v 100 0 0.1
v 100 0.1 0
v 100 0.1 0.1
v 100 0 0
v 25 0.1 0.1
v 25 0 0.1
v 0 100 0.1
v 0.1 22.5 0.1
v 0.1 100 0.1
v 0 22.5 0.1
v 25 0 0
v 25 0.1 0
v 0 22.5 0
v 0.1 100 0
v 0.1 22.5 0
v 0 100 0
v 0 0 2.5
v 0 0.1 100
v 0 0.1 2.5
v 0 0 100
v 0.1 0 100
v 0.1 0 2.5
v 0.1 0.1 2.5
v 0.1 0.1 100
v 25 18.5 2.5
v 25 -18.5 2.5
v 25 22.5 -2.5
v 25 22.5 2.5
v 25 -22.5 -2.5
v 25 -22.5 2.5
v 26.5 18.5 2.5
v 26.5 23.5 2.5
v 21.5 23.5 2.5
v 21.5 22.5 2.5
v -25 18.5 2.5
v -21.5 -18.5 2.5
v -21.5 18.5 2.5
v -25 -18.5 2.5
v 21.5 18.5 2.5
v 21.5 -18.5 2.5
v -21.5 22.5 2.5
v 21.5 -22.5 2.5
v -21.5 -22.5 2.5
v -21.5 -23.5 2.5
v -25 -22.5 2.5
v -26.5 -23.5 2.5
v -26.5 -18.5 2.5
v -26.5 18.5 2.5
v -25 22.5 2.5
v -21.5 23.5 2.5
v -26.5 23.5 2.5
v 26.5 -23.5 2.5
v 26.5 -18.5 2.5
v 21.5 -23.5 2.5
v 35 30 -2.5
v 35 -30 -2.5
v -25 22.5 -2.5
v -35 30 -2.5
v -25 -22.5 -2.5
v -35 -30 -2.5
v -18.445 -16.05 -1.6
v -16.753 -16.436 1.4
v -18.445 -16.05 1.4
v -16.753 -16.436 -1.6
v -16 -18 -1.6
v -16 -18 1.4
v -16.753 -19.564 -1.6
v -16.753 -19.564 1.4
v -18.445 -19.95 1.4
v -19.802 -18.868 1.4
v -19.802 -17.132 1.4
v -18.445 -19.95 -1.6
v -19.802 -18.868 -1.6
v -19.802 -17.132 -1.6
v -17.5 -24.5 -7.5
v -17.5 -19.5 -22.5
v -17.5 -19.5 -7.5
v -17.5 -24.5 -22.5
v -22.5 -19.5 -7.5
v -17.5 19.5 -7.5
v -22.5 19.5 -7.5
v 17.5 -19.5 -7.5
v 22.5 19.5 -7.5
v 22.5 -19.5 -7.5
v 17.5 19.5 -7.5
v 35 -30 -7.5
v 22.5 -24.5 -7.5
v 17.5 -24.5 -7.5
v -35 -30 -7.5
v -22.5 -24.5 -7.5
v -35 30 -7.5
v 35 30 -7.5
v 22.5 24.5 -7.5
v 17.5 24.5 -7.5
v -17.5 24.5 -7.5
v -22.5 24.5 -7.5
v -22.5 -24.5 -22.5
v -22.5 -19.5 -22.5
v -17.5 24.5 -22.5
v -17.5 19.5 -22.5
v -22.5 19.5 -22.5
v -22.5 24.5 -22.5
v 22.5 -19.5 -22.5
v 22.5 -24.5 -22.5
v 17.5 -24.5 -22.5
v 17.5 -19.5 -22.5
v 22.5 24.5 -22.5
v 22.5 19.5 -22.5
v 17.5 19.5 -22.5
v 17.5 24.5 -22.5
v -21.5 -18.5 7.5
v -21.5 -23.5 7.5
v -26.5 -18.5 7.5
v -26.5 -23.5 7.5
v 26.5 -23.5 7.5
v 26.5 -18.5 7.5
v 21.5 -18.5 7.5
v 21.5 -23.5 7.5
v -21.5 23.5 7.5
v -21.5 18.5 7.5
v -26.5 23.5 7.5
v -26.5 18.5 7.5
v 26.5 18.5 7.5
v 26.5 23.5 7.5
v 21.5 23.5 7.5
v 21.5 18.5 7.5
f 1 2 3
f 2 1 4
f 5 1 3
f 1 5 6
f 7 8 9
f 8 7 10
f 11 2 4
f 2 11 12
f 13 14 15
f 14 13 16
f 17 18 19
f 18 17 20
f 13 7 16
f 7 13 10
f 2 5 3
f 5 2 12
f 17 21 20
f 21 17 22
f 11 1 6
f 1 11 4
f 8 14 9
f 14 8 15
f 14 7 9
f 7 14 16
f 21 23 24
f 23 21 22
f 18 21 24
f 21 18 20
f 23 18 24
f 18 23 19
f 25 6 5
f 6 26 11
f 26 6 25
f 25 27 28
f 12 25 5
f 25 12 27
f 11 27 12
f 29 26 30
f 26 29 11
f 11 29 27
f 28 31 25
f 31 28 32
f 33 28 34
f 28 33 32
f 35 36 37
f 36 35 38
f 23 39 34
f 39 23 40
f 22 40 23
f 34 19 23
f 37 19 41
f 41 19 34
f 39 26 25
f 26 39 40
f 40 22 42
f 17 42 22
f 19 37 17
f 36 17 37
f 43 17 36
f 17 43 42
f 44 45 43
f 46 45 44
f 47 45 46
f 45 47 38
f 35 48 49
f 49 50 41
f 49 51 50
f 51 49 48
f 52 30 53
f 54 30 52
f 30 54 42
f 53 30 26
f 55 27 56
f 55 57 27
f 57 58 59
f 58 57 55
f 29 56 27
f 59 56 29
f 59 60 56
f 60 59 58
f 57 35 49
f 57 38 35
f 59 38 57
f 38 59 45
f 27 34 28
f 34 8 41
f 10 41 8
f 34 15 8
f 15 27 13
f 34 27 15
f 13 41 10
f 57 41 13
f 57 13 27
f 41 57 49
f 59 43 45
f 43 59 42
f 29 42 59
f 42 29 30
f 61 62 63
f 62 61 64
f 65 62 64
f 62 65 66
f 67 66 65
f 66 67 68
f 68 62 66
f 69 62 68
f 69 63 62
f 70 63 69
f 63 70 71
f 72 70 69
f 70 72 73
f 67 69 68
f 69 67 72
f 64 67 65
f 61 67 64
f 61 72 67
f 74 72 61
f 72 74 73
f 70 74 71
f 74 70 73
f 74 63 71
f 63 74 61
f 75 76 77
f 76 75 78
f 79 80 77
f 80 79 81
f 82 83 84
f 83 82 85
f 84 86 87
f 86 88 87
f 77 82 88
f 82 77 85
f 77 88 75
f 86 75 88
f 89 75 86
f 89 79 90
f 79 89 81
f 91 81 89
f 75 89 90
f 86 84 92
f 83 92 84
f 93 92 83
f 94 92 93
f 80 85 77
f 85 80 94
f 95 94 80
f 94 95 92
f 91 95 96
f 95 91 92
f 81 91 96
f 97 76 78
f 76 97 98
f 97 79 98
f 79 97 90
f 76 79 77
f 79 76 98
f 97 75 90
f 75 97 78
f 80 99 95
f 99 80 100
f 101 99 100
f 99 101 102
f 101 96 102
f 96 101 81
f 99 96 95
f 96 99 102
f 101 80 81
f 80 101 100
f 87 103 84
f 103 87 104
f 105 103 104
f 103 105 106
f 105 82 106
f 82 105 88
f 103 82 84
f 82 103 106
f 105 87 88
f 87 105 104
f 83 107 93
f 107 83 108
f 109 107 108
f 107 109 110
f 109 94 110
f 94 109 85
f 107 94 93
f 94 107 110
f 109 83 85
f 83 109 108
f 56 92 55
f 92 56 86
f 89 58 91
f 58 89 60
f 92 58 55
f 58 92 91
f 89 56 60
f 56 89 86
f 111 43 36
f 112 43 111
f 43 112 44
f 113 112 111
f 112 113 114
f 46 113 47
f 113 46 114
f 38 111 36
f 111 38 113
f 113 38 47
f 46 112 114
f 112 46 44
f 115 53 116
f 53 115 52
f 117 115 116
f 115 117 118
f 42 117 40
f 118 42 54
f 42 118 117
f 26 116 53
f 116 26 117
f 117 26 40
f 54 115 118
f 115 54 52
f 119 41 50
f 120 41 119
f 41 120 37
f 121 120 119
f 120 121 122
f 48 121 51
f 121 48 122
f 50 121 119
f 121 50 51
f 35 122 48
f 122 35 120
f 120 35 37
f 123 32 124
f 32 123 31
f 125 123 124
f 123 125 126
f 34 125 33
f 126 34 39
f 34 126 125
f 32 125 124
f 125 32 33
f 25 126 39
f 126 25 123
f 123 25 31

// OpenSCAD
    // Combined Scene

    // Permanent Model
    
    // Permanent Model (Black)
    color([0, 0, 0]) {
        // Your permanent model code here
        cube([100,0.1,0.1], center = false);
        cube([0.1,100,0.1], center = false);
        cube([0.1,0.1,100], center = false);
    }
    

    // Dynamic Model
    translate([0, 0, 0]) {
    // Chair seat dimensions
    seat_height = 5; 
    seat_width = 50; 
    seat_depth = 45; 
    difference() {
        cube([seat_width, seat_depth, seat_height], center=true); // Main seat
        translate([-18, -18, -0.1]) 
            cylinder(h=3, r=2, center=true); // Cutout for lighter seat
    }

    // Ergonomic backrest with a smooth curve
    backrest_height = 30; 
    backrest_width = 50; 
    translate([0, -22, seat_height]) {
        rotate_extrude(angle=180) {
            translate([0, 8, 0])
                circle(r=20); // Smooth backrest curve
        }
    }

    // Chair legs with strength and stability
    leg_height = 15; 
    leg_thickness = 5; 
    for (x = [-1, 1]) {
        for (y = [-1, 1]) {
            translate([20 * x, 22 * y, -leg_height]) {
                cube([leg_thickness, leg_thickness, leg_height], center=true); // All four legs
            }
        }
    }

    // Curved armrests for comfort
    armrest_thickness = 5; 
    for (x = [-1, 1]) {
        translate([25 * x, -25, 10]) {
            difference() {
                scale([1, 0.5, 1])
                    rotate_extrude(angle=180)
                        translate([0, 4, 0])
                        circle(r=5); // Armrest contour
                translate([-6, -0.5, 0])
                    cube([12, 1, armrest_thickness], center=true); // Armrest thickness
            }
        }
    }

    // Base for added stability 
    base_height = 5; 
    base_width = 70; 
    base_depth = 60; 
    translate([0, 0, -base_height]) {
        cube([base_width, base_depth, base_height], center=true); // Base platform
    }
    
    // Tolerance cuts for leg attachment
    tolerance_height = 5; 
    translate([-24, -21, seat_height]) {
        cube([5, 5, tolerance_height], center=true); // Tolerance cutout for leg attachment
    }
    
    translate([24, -21, seat_height]) {
        cube([5, 5, tolerance_height], center=true); // Tolerance cutout for leg attachment
    }

    translate([-24, 21, seat_height]) {
        cube([5, 5, tolerance_height], center=true); // Tolerance cutout for leg attachment
    }

    translate([24, 21, seat_height]) {
        cube([5, 5, tolerance_height], center=true); // Tolerance cutout for leg attachment
    }
}
    
